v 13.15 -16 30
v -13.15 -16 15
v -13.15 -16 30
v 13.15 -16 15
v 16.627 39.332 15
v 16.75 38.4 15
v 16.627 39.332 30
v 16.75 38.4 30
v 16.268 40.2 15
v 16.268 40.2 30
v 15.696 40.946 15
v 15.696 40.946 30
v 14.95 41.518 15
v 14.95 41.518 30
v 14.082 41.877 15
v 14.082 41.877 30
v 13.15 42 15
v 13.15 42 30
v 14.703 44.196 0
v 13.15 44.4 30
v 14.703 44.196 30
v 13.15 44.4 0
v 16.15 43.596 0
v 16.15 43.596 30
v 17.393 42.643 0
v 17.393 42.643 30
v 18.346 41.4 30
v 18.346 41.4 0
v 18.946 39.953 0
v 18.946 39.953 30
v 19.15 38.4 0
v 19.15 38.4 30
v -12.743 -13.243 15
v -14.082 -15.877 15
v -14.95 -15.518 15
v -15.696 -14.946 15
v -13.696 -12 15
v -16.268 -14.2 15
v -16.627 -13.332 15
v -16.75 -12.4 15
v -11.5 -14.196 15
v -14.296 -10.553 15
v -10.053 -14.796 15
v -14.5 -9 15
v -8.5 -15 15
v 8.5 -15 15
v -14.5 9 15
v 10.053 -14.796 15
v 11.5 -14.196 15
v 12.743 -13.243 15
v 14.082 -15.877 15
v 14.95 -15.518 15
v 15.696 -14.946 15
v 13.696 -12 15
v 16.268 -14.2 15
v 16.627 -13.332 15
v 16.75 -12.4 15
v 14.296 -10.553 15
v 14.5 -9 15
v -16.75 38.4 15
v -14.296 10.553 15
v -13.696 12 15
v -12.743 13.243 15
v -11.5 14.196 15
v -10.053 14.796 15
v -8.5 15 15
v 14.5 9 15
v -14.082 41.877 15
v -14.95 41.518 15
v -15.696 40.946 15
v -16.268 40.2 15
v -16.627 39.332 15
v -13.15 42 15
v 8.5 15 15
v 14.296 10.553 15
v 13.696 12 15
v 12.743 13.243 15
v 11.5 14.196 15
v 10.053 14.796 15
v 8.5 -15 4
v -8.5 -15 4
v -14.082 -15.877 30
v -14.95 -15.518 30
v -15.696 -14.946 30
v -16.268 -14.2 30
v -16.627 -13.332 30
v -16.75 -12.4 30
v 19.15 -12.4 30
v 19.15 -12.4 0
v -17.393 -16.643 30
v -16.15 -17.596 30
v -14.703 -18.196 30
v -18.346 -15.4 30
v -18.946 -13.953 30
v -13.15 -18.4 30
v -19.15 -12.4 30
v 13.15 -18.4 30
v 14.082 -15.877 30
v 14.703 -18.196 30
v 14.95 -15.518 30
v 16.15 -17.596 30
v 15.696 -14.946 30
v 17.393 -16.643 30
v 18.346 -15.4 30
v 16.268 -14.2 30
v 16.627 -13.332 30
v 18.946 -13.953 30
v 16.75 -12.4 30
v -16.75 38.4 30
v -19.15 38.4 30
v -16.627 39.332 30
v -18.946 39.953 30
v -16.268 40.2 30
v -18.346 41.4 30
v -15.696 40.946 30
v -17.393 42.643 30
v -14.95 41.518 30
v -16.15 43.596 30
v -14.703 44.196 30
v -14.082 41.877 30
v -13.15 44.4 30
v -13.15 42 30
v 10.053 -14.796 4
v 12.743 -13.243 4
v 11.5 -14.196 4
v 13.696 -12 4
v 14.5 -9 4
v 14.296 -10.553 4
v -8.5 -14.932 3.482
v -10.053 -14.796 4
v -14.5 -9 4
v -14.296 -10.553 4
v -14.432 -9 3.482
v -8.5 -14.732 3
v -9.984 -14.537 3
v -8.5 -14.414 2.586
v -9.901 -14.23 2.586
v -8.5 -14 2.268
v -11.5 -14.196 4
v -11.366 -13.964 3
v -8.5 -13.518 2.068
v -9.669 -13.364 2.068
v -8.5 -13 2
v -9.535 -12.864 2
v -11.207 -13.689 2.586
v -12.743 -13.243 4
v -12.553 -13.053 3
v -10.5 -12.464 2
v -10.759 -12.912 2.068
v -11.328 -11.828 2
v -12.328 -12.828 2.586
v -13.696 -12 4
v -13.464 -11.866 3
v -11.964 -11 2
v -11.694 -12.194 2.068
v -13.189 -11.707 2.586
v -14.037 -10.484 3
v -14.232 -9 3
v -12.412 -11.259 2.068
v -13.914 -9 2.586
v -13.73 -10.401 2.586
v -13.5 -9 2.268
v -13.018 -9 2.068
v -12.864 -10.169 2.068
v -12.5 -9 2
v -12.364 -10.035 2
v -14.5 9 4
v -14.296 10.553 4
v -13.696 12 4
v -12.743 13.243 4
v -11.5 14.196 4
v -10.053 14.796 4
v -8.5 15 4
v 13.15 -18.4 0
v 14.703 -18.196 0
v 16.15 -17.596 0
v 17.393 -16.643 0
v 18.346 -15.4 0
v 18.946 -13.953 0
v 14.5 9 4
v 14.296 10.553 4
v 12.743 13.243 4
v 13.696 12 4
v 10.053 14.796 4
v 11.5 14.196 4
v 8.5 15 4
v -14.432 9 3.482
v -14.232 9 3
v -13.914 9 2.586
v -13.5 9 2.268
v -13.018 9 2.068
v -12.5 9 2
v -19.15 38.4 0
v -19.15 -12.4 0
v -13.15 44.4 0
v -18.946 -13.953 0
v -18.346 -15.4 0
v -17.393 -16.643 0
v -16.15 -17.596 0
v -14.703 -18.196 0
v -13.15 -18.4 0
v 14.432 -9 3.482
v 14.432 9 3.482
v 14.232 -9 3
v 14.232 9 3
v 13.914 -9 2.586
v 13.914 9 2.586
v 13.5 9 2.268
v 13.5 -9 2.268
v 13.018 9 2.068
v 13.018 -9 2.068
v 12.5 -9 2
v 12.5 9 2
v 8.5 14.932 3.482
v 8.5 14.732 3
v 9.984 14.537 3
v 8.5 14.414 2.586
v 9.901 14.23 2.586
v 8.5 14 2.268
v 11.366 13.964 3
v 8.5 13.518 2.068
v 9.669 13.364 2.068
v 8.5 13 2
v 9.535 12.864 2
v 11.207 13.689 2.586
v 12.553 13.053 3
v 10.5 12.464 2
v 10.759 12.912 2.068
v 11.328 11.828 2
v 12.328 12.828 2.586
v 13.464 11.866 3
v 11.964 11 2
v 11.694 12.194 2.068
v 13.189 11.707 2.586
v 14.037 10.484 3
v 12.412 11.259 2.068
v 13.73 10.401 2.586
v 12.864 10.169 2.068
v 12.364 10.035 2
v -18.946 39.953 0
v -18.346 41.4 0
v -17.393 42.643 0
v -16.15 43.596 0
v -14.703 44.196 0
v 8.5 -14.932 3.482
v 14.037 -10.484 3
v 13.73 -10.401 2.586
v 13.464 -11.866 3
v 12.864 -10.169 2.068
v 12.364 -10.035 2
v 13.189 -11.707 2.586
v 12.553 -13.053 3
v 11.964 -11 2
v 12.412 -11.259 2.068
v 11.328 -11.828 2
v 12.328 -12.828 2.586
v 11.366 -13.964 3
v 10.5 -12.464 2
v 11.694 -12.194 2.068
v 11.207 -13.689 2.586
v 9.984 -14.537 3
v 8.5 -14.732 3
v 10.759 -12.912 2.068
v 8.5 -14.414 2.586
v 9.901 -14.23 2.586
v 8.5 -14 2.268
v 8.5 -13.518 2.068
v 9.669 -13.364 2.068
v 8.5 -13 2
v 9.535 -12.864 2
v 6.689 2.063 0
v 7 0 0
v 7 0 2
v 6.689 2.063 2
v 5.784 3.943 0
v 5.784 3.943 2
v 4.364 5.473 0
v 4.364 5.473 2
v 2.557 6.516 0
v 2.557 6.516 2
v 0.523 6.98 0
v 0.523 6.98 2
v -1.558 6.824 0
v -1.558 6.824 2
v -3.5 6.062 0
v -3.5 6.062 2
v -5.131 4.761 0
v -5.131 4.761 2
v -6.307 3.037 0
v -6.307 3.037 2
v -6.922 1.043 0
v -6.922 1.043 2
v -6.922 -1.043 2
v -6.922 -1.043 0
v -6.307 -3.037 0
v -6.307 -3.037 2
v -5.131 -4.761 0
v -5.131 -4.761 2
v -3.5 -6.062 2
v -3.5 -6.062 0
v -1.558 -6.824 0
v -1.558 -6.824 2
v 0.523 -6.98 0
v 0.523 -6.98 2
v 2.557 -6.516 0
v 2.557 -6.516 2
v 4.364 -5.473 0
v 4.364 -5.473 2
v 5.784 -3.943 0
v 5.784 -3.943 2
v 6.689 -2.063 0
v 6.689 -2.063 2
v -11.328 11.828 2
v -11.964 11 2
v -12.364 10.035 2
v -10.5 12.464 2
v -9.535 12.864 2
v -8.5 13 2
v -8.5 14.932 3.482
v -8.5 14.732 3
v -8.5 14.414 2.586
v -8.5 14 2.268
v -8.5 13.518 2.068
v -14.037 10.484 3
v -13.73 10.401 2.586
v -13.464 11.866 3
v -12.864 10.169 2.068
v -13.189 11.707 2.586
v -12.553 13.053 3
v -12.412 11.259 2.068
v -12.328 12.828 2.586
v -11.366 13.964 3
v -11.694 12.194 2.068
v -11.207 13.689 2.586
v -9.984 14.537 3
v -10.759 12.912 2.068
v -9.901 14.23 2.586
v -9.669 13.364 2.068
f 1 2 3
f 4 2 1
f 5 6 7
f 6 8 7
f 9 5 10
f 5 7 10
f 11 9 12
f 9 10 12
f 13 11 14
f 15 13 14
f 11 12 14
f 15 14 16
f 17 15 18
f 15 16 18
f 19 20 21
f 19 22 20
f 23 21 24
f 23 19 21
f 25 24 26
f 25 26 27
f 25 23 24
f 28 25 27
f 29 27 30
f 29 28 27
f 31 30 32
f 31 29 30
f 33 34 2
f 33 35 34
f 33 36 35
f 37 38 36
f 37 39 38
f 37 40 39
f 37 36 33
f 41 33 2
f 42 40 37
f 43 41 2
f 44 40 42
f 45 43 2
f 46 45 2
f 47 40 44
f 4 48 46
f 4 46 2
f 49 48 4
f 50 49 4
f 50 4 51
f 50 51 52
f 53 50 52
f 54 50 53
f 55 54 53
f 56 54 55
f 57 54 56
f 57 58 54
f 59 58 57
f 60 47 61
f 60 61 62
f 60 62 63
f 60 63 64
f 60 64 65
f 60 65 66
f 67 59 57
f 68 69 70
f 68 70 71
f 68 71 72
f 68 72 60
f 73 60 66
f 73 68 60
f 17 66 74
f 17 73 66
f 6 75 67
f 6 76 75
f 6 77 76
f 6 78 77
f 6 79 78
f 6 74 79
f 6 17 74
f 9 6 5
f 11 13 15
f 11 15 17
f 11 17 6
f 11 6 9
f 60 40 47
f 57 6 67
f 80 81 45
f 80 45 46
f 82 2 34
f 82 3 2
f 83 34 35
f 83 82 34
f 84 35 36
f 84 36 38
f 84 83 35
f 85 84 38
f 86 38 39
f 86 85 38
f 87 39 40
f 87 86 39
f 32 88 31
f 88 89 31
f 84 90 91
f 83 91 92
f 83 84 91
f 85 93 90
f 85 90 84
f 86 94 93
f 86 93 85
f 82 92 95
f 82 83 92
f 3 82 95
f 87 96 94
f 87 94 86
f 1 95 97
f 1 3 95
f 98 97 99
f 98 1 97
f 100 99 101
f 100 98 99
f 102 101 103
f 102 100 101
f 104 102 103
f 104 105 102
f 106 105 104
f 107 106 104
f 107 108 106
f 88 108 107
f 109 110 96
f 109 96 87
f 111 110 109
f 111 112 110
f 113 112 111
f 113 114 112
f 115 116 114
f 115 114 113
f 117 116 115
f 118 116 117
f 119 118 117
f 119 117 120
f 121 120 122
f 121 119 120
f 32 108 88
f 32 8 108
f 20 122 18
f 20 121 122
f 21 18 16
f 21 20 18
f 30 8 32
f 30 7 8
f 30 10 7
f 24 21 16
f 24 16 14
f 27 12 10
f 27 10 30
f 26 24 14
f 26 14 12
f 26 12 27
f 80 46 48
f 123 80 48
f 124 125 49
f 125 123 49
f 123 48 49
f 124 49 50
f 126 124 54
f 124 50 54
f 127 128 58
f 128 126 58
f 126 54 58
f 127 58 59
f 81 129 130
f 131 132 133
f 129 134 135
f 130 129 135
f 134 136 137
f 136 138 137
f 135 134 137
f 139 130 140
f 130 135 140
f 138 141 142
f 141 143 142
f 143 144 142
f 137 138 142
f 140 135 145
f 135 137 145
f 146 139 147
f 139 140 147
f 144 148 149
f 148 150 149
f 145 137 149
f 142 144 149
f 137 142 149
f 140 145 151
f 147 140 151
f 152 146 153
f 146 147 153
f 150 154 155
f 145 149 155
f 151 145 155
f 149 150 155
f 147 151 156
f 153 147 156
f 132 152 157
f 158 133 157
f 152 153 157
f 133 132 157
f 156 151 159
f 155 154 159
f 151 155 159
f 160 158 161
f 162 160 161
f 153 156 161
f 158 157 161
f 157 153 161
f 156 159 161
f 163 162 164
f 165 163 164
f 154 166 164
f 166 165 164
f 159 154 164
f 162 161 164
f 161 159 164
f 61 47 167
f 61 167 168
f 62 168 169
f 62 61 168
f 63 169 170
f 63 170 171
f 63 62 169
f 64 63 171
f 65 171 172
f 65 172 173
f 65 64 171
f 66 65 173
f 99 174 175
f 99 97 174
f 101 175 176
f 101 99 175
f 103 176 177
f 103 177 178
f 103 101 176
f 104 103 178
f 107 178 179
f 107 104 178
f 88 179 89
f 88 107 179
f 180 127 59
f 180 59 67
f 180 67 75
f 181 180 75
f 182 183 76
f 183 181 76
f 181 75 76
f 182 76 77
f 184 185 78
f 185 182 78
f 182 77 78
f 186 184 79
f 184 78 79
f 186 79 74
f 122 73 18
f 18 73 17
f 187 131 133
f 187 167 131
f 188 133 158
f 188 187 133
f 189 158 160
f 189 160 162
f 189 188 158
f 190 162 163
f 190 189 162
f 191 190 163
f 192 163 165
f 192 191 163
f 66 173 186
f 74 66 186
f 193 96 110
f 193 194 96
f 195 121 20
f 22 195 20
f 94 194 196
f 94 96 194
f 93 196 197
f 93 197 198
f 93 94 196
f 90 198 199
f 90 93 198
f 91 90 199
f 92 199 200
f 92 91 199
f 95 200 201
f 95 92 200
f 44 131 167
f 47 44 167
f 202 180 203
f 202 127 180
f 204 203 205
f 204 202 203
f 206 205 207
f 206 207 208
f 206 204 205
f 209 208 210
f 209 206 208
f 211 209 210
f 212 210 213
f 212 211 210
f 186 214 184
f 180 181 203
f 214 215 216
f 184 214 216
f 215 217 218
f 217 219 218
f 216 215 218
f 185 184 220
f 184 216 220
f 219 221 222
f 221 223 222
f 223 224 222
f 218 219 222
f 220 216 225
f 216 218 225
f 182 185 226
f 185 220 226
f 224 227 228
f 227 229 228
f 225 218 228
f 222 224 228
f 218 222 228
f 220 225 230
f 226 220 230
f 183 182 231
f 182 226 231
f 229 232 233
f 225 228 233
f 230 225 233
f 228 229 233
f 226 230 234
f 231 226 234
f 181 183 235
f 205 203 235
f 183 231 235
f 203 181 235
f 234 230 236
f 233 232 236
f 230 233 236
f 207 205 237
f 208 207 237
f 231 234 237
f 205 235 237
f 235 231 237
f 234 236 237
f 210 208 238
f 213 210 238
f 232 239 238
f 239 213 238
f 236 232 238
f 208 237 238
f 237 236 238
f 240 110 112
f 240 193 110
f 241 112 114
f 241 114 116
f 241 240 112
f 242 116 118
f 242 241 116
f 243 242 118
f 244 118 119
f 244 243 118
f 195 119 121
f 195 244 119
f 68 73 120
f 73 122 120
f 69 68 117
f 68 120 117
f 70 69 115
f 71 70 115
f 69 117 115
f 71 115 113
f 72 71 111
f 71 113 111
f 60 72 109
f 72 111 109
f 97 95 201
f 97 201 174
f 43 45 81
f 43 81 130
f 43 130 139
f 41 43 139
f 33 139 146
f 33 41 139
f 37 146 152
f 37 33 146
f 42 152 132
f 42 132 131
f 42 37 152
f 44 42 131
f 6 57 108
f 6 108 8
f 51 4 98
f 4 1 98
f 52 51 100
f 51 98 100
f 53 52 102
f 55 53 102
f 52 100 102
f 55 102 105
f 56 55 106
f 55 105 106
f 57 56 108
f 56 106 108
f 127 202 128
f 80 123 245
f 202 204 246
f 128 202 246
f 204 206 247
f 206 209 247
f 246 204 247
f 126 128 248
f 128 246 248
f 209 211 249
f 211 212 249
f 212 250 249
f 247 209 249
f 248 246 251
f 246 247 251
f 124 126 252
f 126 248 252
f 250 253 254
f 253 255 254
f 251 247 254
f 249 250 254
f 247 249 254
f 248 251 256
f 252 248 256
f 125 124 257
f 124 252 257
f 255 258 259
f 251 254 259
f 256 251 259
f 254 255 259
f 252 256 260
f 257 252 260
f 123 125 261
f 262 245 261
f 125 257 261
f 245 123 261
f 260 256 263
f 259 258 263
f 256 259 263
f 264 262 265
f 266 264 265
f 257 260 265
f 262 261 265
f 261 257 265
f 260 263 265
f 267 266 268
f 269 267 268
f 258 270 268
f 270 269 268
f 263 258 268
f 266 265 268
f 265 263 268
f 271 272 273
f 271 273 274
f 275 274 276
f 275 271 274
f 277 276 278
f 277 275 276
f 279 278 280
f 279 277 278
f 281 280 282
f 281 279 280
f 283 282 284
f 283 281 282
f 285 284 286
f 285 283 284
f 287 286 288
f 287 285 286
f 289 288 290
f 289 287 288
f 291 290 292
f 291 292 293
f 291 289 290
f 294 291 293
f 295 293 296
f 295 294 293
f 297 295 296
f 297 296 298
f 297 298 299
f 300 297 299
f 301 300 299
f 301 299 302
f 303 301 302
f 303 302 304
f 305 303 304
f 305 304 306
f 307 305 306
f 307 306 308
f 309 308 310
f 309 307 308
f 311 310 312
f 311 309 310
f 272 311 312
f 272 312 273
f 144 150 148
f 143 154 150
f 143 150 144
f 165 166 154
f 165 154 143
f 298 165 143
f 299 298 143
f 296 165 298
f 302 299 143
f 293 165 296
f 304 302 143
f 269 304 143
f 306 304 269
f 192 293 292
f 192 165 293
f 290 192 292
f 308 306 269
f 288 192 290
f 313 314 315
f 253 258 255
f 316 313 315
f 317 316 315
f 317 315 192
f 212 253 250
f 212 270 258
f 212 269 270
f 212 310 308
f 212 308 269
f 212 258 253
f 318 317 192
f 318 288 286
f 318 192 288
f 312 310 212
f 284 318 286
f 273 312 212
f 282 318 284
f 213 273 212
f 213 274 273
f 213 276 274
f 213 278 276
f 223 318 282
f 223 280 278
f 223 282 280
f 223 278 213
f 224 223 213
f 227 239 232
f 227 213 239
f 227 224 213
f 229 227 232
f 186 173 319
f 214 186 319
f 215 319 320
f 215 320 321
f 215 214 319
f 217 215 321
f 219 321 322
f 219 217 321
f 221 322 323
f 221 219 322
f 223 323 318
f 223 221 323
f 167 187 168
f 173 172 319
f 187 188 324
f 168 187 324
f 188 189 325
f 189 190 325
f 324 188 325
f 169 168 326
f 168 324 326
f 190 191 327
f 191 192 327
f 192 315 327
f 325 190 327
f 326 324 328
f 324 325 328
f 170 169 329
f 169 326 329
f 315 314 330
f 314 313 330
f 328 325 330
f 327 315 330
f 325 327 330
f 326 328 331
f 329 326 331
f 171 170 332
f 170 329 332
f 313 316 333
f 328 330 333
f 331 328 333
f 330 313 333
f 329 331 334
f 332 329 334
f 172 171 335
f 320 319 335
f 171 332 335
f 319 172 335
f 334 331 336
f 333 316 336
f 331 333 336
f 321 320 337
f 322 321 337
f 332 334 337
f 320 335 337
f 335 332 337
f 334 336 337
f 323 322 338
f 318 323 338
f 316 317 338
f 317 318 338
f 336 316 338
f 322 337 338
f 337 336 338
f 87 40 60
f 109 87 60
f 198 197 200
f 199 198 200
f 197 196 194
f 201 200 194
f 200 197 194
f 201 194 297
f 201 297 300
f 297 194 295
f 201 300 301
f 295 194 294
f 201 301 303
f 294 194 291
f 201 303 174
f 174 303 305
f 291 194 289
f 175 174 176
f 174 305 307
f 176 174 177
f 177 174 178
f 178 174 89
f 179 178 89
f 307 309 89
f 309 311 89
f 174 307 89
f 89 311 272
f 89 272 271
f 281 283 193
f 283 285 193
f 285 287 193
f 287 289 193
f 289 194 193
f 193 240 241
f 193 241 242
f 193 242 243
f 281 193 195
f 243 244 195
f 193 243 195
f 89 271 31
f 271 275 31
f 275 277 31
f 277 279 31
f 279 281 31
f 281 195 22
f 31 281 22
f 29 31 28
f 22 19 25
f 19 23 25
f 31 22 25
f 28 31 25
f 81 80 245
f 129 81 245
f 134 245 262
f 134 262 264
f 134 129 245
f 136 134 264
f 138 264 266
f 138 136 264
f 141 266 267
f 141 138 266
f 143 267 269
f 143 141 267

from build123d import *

# Parameters (mm, degrees)
SKETCH1_W           = 38.3
SKETCH1_H           = 62.8
SKETCH1_W_2         = 33.5
SKETCH1_H_2         = 58
SKETCH1_W_3         = 29
SKETCH1_H_3         = 30
SKETCH1_R           = 7
BOSS_EXTRUDE1_DEPTH = 2
BOSS_EXTRUDE2_START = 2
SKETCH1_3_W         = 38.3
SKETCH1_3_H         = 62.8
SKETCH1_3_W_2       = 33.5
SKETCH1_3_H_2       = 58
SKETCH1_3_W_3       = 29
SKETCH1_3_H_3       = 30
BOSS_EXTRUDE2_DEPTH = 13
BOSS_EXTRUDE3_START = 15
SKETCH1_4_W         = 38.3
SKETCH1_4_H         = 62.8
SKETCH1_4_W_2       = 33.5
SKETCH1_4_H_2       = 58
BOSS_EXTRUDE3_DEPTH = 15
FILLET1_R           = 3.6
FILLET2_R           = 6
FILLET3_R           = 2


with BuildPart() as part:
    # Sketch1 → Boss-Extrude1 (new body)
    # profile 1 of 3: a face of its own
    with BuildSketch(Plane.XY):
        with Locations((0, 13)):
            Rectangle(SKETCH1_W, SKETCH1_H)
        with Locations((0, 13)):
            Rectangle(SKETCH1_W_2, SKETCH1_H_2, mode=Mode.SUBTRACT)
    # profile 2 of 3: a face of its own
    with BuildSketch(Plane.XY):
        with Locations((0, 13)):
            Rectangle(SKETCH1_W_2, SKETCH1_H_2)
        Rectangle(SKETCH1_W_3, SKETCH1_H_3, mode=Mode.SUBTRACT)
    # profile 3 of 3: a face of its own
    with BuildSketch(Plane.XY):
        Rectangle(SKETCH1_W_3, SKETCH1_H_3)
        Circle(SKETCH1_R, mode=Mode.SUBTRACT)
    extrude(amount=BOSS_EXTRUDE1_DEPTH)

    # Sketch1<3> → Boss-Extrude2 (add)
    # profile 1 of 2: a face of its own
    with BuildSketch(Plane.XY.offset(BOSS_EXTRUDE2_START)):
        with Locations((0, 13)):
            Rectangle(SKETCH1_3_W, SKETCH1_3_H)
        with Locations((0, 13)):
            Rectangle(SKETCH1_3_W_2, SKETCH1_3_H_2, mode=Mode.SUBTRACT)
    # profile 2 of 2: a face of its own
    with BuildSketch(Plane.XY.offset(BOSS_EXTRUDE2_START)):
        with Locations((0, 13)):
            Rectangle(SKETCH1_3_W_2, SKETCH1_3_H_2)
        Rectangle(SKETCH1_3_W_3, SKETCH1_3_H_3, mode=Mode.SUBTRACT)
    extrude(amount=BOSS_EXTRUDE2_DEPTH)

    # Sketch1<4> → Boss-Extrude3 (add)
    with BuildSketch(Plane.XY.offset(BOSS_EXTRUDE3_START)):
        with Locations((0, 13)):
            Rectangle(SKETCH1_4_W, SKETCH1_4_H)
        with Locations((0, 13)):
            Rectangle(SKETCH1_4_W_2, SKETCH1_4_H_2, mode=Mode.SUBTRACT)
    extrude(amount=BOSS_EXTRUDE3_DEPTH)

    # Fillet1
    fillet1_edges = [part.edges().sort_by_distance(p)[0] for p in [
        (-16.75, 42, 22.5),
        (-16.75, -16, 22.5),
        (16.75, -16, 22.5),
        (16.75, 42, 22.5),
    ]]
    fillet(fillet1_edges, radius=FILLET1_R)

    # Fillet2
    fillet2_edges = [part.edges().sort_by_distance(p)[0] for p in [
        (19.15, -18.4, 15),
        (-19.15, -18.4, 15),
        (-19.15, 44.4, 15),
        (19.15, 44.4, 15),
        (14.5, -15, 8.5),
        (14.5, 15, 8.5),
        (-14.5, 15, 8.5),
        (-14.5, -15, 8.5),
    ]]
    fillet(fillet2_edges, radius=FILLET2_R)

    # Fillet3
    fillet3_edges = [part.edges().sort_by_distance(p)[0] for p in [
        (-14.5, 0, 2),
        (0, -15, 2),
        (14.5, 0, 2),
        (0, 15, 2),
        (12.742640687, 13.242640687, 2),
        (12.742640687, -13.242640687, 2),
        (-12.742640687, 13.242640687, 2),
        (-12.742640687, -13.242640687, 2),
    ]]
    fillet(fillet3_edges, radius=FILLET3_R)


solid = part.part
